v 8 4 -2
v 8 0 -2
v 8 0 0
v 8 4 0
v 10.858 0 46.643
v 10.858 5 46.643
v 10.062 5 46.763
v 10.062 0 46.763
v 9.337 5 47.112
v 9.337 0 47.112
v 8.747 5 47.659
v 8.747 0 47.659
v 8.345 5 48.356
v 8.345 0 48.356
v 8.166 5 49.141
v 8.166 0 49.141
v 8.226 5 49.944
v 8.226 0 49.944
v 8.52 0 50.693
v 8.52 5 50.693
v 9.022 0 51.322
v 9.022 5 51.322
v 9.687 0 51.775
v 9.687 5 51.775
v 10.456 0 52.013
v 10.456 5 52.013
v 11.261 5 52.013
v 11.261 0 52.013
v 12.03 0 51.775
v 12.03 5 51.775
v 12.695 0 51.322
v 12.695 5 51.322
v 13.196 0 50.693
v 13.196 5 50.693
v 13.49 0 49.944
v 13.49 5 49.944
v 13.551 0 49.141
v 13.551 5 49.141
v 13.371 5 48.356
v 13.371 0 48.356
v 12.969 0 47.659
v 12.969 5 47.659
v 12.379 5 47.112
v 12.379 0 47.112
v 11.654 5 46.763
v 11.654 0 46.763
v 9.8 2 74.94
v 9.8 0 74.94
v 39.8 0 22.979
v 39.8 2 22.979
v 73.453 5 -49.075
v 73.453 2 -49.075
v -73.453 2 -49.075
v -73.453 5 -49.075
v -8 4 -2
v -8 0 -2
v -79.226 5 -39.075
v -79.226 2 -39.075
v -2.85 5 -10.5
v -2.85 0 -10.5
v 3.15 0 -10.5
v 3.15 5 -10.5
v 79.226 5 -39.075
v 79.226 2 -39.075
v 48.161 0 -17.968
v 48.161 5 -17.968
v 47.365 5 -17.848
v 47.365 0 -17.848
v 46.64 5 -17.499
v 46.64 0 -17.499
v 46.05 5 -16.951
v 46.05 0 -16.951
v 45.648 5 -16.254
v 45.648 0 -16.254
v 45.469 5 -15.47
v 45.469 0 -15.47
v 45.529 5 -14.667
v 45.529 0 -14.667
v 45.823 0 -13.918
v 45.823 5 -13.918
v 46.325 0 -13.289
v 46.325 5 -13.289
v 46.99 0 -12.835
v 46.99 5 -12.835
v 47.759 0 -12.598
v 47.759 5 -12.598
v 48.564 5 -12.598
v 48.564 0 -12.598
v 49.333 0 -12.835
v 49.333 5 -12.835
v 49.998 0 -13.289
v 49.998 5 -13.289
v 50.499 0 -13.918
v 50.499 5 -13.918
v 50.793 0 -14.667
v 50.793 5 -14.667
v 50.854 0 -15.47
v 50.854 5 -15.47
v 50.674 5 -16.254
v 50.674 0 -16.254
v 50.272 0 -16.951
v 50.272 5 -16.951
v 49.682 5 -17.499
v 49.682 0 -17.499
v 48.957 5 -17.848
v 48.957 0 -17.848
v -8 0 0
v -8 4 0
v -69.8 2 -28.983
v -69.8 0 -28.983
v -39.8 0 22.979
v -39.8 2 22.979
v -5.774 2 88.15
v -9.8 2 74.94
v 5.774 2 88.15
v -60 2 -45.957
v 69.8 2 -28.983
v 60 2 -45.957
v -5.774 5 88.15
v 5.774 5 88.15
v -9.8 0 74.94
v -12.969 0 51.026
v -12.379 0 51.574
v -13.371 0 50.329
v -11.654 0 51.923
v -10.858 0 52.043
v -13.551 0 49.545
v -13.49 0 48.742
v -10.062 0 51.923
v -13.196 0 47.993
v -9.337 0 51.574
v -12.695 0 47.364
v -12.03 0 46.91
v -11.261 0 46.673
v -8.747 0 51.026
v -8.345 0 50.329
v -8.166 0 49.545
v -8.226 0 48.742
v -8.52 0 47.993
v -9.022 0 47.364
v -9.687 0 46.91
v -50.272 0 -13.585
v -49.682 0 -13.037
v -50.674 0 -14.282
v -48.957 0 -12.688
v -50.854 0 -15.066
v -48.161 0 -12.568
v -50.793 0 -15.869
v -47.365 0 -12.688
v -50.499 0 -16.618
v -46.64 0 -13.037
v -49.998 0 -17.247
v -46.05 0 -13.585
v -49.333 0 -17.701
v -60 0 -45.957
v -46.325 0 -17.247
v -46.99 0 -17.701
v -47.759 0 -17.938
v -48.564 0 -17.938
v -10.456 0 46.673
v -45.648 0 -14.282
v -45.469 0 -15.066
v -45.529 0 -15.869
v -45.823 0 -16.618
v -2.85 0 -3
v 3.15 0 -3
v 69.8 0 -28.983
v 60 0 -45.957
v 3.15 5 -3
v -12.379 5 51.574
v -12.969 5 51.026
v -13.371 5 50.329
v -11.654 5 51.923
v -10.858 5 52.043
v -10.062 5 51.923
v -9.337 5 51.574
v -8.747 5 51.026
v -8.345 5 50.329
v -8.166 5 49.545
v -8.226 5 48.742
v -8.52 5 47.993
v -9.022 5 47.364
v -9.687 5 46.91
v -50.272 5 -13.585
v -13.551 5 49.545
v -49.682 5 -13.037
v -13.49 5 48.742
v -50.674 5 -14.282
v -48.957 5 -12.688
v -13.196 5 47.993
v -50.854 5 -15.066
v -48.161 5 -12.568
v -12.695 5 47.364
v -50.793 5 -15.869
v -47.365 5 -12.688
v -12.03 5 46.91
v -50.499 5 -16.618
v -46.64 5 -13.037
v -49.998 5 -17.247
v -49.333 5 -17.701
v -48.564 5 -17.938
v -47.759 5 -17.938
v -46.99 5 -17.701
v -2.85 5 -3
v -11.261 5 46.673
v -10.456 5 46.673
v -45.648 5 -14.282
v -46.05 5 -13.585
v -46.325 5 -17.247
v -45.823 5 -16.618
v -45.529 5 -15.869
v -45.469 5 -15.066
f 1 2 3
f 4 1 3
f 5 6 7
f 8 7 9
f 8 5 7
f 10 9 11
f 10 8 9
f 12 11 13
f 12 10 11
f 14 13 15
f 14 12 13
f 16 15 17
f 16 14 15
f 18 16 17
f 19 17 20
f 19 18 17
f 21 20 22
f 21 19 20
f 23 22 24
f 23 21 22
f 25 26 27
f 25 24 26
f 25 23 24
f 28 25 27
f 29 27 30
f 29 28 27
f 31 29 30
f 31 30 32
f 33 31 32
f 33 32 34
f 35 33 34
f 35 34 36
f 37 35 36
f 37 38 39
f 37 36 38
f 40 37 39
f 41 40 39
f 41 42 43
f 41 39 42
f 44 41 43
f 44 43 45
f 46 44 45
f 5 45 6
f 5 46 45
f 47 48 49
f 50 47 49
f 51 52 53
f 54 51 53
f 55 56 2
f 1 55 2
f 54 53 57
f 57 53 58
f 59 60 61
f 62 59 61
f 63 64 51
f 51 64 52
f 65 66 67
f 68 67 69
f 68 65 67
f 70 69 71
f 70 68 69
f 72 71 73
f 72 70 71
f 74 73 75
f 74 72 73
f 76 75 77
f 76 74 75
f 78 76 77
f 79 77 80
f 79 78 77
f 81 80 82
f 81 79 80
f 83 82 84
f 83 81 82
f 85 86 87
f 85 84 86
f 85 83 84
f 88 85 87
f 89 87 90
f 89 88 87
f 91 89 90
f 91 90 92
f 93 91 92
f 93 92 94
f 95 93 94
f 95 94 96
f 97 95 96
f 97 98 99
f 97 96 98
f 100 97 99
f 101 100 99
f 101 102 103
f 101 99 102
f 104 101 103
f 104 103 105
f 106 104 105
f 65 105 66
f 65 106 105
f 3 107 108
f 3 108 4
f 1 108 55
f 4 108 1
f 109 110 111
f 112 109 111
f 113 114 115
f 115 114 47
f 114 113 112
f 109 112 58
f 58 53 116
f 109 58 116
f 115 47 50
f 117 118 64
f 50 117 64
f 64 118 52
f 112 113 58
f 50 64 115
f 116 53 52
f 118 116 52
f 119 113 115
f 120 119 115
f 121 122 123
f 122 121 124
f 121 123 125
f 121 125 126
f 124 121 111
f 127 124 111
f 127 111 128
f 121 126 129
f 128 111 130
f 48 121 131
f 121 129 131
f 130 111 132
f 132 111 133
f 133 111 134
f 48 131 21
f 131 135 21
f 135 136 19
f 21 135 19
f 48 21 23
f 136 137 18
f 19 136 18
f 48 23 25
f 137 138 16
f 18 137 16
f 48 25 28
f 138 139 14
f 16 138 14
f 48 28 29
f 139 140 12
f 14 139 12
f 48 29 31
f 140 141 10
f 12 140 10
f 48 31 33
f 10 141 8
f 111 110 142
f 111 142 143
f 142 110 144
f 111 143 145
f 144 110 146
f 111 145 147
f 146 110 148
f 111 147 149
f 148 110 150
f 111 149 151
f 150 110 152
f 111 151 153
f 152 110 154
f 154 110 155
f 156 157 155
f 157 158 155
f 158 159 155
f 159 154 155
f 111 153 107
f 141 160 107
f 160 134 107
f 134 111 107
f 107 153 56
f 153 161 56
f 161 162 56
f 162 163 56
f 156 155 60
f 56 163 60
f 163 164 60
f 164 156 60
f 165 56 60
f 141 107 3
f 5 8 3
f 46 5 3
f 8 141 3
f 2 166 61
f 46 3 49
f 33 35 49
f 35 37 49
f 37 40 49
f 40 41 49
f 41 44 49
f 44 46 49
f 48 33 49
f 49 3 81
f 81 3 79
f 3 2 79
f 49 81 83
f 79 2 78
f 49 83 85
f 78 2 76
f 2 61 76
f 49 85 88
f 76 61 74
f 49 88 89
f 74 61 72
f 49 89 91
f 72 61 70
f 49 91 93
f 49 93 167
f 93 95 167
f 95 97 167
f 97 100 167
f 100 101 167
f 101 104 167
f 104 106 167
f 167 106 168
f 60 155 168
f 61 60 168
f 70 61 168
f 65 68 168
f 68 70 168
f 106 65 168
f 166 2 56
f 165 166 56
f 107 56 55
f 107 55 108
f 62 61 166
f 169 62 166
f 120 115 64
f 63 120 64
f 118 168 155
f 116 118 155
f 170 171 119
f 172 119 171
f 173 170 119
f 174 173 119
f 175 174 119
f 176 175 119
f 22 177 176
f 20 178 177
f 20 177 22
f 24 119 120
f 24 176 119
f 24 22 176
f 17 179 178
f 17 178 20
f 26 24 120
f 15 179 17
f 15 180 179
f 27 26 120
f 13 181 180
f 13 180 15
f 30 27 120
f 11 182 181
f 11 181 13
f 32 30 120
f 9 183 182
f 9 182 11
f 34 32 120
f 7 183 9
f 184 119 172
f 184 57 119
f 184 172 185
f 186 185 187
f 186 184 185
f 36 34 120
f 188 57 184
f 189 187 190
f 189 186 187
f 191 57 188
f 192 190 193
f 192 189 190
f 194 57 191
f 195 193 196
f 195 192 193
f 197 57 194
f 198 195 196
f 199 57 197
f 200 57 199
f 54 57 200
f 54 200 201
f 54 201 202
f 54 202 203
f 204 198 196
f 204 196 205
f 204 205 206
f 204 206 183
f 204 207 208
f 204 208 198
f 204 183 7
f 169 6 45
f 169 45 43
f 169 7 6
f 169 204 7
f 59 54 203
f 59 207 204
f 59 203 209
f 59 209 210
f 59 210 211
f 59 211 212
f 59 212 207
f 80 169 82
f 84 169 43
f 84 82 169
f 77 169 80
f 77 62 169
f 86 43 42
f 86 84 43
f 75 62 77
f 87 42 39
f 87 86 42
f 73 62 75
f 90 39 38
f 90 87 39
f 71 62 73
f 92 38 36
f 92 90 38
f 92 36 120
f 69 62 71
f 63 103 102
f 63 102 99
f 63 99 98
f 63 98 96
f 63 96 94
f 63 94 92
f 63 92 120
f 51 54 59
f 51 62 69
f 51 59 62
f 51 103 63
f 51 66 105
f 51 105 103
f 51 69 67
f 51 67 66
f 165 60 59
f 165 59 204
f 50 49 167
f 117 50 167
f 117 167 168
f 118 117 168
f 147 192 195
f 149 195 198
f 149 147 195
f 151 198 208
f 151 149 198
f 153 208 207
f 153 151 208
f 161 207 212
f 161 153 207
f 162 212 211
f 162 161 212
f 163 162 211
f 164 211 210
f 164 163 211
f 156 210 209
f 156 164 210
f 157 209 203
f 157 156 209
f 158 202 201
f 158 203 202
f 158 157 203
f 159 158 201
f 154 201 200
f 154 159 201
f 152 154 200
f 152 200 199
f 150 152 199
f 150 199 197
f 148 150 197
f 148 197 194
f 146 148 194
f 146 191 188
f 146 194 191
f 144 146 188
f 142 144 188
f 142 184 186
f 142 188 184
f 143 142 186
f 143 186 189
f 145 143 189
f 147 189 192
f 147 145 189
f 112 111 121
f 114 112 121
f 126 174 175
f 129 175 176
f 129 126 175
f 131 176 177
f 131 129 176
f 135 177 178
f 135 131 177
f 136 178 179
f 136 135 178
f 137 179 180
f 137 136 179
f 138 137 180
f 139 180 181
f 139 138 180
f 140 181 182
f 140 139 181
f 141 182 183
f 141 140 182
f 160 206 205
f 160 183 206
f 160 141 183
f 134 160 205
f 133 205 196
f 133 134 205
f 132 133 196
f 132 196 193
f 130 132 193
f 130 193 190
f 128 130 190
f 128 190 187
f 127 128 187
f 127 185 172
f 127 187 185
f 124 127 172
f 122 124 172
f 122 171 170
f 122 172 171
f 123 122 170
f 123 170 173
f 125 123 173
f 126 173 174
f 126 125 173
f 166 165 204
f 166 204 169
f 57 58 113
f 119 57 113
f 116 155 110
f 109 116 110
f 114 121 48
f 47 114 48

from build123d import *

# Parameters (mm, degrees)
SKETCH1_R           = 45.957081427
BOSS_EXTRUDE1_DEPTH = 2
BOSS_EXTRUDE2_DEPTH = 3
SKETCH3_R           = 2.7
CUT_EXTRUDE1_DEPTH  = 119.626220937
SKETCH5_W           = 16
SKETCH5_H           = 2
CUT_EXTRUDE2_DEPTH  = 4
SKETCH6_W           = 6
SKETCH6_H           = 7.5
CUT_EXTRUDE3_DEPTH  = 67


with BuildPart() as part:
    # Sketch1 → Boss-Extrude1 (new body)
    with BuildSketch(Plane(origin=(0, 0, 0), x_dir=(1, 0, 0), z_dir=(0, 1, 0))):
        with BuildLine():
            Line((-1.88e-07, 45.957081427), (-60, 45.957081427))
            Line((-60, 45.957081427), (-69.8, 28.982983513))
            Line((-69.8, 28.982983513), (-39.800000841, -22.978539257))
            ThreePointArc((-39.800000841, -22.978539257), (-39.799999627, 22.97854136), (-1.88e-07, 45.957081427))
        make_face()
        Circle(SKETCH1_R)
        with BuildLine():
            Line((60, 45.957081427), (-1.88e-07, 45.957081427))
            ThreePointArc((-1.88e-07, 45.957081427), (32.496563854, 32.496563988), (45.957081427, 0))
            ThreePointArc((45.957081427, 0), (44.391132009, -11.894567342), (39.80000061, -22.978539658))
            Line((39.80000061, -22.978539658), (69.8, 28.982983513))
            Line((69.8, 28.982983513), (60, 45.957081427))
        make_face()
        with BuildLine():
            ThreePointArc((39.80000061, -22.978539658), (-2.31e-07, -45.957081427), (-39.800000841, -22.978539257))
            Line((-39.800000841, -22.978539257), (-9.8, -74.940064941))
            Line((-9.8, -74.940064941), (9.8, -74.940064941))
            Line((9.8, -74.940064941), (39.80000061, -22.978539658))
        make_face()
    extrude(amount=BOSS_EXTRUDE1_DEPTH)

    # Sketch2 → Boss-Extrude2 (add)
    with BuildSketch(Plane(origin=(0, 2, 0), x_dir=(1, 0, 0), z_dir=(0, 1, 0))):
        Polygon((-73.452994616, 49.074772881), (-79.226497308, 39.074772881), (-5.773502692, -88.149545762), (5.773502692, -88.149545762), (79.226497308, 39.074772881), (73.452994616, 49.074772881), align=None)
    extrude(amount=BOSS_EXTRUDE2_DEPTH)

    # Sketch3 → Cut-Extrude1 (cut, through all)
    with BuildSketch(Plane(origin=(0, 0, 0), x_dir=(1, 0, 0), z_dir=(0, 1, 0))):
        with Locations(Location((-48.161138908, 15.267993776, 0), (0, 0, 270))):
            Circle(SKETCH3_R)
        with Locations(Location((-10.858098979, -49.342766658, 0), (0, 0, 270))):
            Circle(SKETCH3_R)
        with Locations(Location((10.858098979, -49.342766658, 0), (0, 0, 90))):
            Circle(SKETCH3_R)
        with Locations(Location((48.161138908, 15.267993776, 0), (0, 0, 90))):
            Circle(SKETCH3_R)
    extrude(amount=CUT_EXTRUDE1_DEPTH, mode=Mode.SUBTRACT)

    # Sketch5 → Cut-Extrude2 (cut)
    with BuildSketch(Plane.XZ):
        with Locations((0, -1)):
            Rectangle(SKETCH5_W, SKETCH5_H)
    extrude(amount=-CUT_EXTRUDE2_DEPTH, mode=Mode.SUBTRACT)

    # Sketch6 → Cut-Extrude3 (cut)
    with BuildSketch(Plane.XZ):
        with Locations((0.15, -6.75)):
            Rectangle(SKETCH6_W, SKETCH6_H)
    extrude(amount=-CUT_EXTRUDE3_DEPTH, mode=Mode.SUBTRACT)


solid = part.part
